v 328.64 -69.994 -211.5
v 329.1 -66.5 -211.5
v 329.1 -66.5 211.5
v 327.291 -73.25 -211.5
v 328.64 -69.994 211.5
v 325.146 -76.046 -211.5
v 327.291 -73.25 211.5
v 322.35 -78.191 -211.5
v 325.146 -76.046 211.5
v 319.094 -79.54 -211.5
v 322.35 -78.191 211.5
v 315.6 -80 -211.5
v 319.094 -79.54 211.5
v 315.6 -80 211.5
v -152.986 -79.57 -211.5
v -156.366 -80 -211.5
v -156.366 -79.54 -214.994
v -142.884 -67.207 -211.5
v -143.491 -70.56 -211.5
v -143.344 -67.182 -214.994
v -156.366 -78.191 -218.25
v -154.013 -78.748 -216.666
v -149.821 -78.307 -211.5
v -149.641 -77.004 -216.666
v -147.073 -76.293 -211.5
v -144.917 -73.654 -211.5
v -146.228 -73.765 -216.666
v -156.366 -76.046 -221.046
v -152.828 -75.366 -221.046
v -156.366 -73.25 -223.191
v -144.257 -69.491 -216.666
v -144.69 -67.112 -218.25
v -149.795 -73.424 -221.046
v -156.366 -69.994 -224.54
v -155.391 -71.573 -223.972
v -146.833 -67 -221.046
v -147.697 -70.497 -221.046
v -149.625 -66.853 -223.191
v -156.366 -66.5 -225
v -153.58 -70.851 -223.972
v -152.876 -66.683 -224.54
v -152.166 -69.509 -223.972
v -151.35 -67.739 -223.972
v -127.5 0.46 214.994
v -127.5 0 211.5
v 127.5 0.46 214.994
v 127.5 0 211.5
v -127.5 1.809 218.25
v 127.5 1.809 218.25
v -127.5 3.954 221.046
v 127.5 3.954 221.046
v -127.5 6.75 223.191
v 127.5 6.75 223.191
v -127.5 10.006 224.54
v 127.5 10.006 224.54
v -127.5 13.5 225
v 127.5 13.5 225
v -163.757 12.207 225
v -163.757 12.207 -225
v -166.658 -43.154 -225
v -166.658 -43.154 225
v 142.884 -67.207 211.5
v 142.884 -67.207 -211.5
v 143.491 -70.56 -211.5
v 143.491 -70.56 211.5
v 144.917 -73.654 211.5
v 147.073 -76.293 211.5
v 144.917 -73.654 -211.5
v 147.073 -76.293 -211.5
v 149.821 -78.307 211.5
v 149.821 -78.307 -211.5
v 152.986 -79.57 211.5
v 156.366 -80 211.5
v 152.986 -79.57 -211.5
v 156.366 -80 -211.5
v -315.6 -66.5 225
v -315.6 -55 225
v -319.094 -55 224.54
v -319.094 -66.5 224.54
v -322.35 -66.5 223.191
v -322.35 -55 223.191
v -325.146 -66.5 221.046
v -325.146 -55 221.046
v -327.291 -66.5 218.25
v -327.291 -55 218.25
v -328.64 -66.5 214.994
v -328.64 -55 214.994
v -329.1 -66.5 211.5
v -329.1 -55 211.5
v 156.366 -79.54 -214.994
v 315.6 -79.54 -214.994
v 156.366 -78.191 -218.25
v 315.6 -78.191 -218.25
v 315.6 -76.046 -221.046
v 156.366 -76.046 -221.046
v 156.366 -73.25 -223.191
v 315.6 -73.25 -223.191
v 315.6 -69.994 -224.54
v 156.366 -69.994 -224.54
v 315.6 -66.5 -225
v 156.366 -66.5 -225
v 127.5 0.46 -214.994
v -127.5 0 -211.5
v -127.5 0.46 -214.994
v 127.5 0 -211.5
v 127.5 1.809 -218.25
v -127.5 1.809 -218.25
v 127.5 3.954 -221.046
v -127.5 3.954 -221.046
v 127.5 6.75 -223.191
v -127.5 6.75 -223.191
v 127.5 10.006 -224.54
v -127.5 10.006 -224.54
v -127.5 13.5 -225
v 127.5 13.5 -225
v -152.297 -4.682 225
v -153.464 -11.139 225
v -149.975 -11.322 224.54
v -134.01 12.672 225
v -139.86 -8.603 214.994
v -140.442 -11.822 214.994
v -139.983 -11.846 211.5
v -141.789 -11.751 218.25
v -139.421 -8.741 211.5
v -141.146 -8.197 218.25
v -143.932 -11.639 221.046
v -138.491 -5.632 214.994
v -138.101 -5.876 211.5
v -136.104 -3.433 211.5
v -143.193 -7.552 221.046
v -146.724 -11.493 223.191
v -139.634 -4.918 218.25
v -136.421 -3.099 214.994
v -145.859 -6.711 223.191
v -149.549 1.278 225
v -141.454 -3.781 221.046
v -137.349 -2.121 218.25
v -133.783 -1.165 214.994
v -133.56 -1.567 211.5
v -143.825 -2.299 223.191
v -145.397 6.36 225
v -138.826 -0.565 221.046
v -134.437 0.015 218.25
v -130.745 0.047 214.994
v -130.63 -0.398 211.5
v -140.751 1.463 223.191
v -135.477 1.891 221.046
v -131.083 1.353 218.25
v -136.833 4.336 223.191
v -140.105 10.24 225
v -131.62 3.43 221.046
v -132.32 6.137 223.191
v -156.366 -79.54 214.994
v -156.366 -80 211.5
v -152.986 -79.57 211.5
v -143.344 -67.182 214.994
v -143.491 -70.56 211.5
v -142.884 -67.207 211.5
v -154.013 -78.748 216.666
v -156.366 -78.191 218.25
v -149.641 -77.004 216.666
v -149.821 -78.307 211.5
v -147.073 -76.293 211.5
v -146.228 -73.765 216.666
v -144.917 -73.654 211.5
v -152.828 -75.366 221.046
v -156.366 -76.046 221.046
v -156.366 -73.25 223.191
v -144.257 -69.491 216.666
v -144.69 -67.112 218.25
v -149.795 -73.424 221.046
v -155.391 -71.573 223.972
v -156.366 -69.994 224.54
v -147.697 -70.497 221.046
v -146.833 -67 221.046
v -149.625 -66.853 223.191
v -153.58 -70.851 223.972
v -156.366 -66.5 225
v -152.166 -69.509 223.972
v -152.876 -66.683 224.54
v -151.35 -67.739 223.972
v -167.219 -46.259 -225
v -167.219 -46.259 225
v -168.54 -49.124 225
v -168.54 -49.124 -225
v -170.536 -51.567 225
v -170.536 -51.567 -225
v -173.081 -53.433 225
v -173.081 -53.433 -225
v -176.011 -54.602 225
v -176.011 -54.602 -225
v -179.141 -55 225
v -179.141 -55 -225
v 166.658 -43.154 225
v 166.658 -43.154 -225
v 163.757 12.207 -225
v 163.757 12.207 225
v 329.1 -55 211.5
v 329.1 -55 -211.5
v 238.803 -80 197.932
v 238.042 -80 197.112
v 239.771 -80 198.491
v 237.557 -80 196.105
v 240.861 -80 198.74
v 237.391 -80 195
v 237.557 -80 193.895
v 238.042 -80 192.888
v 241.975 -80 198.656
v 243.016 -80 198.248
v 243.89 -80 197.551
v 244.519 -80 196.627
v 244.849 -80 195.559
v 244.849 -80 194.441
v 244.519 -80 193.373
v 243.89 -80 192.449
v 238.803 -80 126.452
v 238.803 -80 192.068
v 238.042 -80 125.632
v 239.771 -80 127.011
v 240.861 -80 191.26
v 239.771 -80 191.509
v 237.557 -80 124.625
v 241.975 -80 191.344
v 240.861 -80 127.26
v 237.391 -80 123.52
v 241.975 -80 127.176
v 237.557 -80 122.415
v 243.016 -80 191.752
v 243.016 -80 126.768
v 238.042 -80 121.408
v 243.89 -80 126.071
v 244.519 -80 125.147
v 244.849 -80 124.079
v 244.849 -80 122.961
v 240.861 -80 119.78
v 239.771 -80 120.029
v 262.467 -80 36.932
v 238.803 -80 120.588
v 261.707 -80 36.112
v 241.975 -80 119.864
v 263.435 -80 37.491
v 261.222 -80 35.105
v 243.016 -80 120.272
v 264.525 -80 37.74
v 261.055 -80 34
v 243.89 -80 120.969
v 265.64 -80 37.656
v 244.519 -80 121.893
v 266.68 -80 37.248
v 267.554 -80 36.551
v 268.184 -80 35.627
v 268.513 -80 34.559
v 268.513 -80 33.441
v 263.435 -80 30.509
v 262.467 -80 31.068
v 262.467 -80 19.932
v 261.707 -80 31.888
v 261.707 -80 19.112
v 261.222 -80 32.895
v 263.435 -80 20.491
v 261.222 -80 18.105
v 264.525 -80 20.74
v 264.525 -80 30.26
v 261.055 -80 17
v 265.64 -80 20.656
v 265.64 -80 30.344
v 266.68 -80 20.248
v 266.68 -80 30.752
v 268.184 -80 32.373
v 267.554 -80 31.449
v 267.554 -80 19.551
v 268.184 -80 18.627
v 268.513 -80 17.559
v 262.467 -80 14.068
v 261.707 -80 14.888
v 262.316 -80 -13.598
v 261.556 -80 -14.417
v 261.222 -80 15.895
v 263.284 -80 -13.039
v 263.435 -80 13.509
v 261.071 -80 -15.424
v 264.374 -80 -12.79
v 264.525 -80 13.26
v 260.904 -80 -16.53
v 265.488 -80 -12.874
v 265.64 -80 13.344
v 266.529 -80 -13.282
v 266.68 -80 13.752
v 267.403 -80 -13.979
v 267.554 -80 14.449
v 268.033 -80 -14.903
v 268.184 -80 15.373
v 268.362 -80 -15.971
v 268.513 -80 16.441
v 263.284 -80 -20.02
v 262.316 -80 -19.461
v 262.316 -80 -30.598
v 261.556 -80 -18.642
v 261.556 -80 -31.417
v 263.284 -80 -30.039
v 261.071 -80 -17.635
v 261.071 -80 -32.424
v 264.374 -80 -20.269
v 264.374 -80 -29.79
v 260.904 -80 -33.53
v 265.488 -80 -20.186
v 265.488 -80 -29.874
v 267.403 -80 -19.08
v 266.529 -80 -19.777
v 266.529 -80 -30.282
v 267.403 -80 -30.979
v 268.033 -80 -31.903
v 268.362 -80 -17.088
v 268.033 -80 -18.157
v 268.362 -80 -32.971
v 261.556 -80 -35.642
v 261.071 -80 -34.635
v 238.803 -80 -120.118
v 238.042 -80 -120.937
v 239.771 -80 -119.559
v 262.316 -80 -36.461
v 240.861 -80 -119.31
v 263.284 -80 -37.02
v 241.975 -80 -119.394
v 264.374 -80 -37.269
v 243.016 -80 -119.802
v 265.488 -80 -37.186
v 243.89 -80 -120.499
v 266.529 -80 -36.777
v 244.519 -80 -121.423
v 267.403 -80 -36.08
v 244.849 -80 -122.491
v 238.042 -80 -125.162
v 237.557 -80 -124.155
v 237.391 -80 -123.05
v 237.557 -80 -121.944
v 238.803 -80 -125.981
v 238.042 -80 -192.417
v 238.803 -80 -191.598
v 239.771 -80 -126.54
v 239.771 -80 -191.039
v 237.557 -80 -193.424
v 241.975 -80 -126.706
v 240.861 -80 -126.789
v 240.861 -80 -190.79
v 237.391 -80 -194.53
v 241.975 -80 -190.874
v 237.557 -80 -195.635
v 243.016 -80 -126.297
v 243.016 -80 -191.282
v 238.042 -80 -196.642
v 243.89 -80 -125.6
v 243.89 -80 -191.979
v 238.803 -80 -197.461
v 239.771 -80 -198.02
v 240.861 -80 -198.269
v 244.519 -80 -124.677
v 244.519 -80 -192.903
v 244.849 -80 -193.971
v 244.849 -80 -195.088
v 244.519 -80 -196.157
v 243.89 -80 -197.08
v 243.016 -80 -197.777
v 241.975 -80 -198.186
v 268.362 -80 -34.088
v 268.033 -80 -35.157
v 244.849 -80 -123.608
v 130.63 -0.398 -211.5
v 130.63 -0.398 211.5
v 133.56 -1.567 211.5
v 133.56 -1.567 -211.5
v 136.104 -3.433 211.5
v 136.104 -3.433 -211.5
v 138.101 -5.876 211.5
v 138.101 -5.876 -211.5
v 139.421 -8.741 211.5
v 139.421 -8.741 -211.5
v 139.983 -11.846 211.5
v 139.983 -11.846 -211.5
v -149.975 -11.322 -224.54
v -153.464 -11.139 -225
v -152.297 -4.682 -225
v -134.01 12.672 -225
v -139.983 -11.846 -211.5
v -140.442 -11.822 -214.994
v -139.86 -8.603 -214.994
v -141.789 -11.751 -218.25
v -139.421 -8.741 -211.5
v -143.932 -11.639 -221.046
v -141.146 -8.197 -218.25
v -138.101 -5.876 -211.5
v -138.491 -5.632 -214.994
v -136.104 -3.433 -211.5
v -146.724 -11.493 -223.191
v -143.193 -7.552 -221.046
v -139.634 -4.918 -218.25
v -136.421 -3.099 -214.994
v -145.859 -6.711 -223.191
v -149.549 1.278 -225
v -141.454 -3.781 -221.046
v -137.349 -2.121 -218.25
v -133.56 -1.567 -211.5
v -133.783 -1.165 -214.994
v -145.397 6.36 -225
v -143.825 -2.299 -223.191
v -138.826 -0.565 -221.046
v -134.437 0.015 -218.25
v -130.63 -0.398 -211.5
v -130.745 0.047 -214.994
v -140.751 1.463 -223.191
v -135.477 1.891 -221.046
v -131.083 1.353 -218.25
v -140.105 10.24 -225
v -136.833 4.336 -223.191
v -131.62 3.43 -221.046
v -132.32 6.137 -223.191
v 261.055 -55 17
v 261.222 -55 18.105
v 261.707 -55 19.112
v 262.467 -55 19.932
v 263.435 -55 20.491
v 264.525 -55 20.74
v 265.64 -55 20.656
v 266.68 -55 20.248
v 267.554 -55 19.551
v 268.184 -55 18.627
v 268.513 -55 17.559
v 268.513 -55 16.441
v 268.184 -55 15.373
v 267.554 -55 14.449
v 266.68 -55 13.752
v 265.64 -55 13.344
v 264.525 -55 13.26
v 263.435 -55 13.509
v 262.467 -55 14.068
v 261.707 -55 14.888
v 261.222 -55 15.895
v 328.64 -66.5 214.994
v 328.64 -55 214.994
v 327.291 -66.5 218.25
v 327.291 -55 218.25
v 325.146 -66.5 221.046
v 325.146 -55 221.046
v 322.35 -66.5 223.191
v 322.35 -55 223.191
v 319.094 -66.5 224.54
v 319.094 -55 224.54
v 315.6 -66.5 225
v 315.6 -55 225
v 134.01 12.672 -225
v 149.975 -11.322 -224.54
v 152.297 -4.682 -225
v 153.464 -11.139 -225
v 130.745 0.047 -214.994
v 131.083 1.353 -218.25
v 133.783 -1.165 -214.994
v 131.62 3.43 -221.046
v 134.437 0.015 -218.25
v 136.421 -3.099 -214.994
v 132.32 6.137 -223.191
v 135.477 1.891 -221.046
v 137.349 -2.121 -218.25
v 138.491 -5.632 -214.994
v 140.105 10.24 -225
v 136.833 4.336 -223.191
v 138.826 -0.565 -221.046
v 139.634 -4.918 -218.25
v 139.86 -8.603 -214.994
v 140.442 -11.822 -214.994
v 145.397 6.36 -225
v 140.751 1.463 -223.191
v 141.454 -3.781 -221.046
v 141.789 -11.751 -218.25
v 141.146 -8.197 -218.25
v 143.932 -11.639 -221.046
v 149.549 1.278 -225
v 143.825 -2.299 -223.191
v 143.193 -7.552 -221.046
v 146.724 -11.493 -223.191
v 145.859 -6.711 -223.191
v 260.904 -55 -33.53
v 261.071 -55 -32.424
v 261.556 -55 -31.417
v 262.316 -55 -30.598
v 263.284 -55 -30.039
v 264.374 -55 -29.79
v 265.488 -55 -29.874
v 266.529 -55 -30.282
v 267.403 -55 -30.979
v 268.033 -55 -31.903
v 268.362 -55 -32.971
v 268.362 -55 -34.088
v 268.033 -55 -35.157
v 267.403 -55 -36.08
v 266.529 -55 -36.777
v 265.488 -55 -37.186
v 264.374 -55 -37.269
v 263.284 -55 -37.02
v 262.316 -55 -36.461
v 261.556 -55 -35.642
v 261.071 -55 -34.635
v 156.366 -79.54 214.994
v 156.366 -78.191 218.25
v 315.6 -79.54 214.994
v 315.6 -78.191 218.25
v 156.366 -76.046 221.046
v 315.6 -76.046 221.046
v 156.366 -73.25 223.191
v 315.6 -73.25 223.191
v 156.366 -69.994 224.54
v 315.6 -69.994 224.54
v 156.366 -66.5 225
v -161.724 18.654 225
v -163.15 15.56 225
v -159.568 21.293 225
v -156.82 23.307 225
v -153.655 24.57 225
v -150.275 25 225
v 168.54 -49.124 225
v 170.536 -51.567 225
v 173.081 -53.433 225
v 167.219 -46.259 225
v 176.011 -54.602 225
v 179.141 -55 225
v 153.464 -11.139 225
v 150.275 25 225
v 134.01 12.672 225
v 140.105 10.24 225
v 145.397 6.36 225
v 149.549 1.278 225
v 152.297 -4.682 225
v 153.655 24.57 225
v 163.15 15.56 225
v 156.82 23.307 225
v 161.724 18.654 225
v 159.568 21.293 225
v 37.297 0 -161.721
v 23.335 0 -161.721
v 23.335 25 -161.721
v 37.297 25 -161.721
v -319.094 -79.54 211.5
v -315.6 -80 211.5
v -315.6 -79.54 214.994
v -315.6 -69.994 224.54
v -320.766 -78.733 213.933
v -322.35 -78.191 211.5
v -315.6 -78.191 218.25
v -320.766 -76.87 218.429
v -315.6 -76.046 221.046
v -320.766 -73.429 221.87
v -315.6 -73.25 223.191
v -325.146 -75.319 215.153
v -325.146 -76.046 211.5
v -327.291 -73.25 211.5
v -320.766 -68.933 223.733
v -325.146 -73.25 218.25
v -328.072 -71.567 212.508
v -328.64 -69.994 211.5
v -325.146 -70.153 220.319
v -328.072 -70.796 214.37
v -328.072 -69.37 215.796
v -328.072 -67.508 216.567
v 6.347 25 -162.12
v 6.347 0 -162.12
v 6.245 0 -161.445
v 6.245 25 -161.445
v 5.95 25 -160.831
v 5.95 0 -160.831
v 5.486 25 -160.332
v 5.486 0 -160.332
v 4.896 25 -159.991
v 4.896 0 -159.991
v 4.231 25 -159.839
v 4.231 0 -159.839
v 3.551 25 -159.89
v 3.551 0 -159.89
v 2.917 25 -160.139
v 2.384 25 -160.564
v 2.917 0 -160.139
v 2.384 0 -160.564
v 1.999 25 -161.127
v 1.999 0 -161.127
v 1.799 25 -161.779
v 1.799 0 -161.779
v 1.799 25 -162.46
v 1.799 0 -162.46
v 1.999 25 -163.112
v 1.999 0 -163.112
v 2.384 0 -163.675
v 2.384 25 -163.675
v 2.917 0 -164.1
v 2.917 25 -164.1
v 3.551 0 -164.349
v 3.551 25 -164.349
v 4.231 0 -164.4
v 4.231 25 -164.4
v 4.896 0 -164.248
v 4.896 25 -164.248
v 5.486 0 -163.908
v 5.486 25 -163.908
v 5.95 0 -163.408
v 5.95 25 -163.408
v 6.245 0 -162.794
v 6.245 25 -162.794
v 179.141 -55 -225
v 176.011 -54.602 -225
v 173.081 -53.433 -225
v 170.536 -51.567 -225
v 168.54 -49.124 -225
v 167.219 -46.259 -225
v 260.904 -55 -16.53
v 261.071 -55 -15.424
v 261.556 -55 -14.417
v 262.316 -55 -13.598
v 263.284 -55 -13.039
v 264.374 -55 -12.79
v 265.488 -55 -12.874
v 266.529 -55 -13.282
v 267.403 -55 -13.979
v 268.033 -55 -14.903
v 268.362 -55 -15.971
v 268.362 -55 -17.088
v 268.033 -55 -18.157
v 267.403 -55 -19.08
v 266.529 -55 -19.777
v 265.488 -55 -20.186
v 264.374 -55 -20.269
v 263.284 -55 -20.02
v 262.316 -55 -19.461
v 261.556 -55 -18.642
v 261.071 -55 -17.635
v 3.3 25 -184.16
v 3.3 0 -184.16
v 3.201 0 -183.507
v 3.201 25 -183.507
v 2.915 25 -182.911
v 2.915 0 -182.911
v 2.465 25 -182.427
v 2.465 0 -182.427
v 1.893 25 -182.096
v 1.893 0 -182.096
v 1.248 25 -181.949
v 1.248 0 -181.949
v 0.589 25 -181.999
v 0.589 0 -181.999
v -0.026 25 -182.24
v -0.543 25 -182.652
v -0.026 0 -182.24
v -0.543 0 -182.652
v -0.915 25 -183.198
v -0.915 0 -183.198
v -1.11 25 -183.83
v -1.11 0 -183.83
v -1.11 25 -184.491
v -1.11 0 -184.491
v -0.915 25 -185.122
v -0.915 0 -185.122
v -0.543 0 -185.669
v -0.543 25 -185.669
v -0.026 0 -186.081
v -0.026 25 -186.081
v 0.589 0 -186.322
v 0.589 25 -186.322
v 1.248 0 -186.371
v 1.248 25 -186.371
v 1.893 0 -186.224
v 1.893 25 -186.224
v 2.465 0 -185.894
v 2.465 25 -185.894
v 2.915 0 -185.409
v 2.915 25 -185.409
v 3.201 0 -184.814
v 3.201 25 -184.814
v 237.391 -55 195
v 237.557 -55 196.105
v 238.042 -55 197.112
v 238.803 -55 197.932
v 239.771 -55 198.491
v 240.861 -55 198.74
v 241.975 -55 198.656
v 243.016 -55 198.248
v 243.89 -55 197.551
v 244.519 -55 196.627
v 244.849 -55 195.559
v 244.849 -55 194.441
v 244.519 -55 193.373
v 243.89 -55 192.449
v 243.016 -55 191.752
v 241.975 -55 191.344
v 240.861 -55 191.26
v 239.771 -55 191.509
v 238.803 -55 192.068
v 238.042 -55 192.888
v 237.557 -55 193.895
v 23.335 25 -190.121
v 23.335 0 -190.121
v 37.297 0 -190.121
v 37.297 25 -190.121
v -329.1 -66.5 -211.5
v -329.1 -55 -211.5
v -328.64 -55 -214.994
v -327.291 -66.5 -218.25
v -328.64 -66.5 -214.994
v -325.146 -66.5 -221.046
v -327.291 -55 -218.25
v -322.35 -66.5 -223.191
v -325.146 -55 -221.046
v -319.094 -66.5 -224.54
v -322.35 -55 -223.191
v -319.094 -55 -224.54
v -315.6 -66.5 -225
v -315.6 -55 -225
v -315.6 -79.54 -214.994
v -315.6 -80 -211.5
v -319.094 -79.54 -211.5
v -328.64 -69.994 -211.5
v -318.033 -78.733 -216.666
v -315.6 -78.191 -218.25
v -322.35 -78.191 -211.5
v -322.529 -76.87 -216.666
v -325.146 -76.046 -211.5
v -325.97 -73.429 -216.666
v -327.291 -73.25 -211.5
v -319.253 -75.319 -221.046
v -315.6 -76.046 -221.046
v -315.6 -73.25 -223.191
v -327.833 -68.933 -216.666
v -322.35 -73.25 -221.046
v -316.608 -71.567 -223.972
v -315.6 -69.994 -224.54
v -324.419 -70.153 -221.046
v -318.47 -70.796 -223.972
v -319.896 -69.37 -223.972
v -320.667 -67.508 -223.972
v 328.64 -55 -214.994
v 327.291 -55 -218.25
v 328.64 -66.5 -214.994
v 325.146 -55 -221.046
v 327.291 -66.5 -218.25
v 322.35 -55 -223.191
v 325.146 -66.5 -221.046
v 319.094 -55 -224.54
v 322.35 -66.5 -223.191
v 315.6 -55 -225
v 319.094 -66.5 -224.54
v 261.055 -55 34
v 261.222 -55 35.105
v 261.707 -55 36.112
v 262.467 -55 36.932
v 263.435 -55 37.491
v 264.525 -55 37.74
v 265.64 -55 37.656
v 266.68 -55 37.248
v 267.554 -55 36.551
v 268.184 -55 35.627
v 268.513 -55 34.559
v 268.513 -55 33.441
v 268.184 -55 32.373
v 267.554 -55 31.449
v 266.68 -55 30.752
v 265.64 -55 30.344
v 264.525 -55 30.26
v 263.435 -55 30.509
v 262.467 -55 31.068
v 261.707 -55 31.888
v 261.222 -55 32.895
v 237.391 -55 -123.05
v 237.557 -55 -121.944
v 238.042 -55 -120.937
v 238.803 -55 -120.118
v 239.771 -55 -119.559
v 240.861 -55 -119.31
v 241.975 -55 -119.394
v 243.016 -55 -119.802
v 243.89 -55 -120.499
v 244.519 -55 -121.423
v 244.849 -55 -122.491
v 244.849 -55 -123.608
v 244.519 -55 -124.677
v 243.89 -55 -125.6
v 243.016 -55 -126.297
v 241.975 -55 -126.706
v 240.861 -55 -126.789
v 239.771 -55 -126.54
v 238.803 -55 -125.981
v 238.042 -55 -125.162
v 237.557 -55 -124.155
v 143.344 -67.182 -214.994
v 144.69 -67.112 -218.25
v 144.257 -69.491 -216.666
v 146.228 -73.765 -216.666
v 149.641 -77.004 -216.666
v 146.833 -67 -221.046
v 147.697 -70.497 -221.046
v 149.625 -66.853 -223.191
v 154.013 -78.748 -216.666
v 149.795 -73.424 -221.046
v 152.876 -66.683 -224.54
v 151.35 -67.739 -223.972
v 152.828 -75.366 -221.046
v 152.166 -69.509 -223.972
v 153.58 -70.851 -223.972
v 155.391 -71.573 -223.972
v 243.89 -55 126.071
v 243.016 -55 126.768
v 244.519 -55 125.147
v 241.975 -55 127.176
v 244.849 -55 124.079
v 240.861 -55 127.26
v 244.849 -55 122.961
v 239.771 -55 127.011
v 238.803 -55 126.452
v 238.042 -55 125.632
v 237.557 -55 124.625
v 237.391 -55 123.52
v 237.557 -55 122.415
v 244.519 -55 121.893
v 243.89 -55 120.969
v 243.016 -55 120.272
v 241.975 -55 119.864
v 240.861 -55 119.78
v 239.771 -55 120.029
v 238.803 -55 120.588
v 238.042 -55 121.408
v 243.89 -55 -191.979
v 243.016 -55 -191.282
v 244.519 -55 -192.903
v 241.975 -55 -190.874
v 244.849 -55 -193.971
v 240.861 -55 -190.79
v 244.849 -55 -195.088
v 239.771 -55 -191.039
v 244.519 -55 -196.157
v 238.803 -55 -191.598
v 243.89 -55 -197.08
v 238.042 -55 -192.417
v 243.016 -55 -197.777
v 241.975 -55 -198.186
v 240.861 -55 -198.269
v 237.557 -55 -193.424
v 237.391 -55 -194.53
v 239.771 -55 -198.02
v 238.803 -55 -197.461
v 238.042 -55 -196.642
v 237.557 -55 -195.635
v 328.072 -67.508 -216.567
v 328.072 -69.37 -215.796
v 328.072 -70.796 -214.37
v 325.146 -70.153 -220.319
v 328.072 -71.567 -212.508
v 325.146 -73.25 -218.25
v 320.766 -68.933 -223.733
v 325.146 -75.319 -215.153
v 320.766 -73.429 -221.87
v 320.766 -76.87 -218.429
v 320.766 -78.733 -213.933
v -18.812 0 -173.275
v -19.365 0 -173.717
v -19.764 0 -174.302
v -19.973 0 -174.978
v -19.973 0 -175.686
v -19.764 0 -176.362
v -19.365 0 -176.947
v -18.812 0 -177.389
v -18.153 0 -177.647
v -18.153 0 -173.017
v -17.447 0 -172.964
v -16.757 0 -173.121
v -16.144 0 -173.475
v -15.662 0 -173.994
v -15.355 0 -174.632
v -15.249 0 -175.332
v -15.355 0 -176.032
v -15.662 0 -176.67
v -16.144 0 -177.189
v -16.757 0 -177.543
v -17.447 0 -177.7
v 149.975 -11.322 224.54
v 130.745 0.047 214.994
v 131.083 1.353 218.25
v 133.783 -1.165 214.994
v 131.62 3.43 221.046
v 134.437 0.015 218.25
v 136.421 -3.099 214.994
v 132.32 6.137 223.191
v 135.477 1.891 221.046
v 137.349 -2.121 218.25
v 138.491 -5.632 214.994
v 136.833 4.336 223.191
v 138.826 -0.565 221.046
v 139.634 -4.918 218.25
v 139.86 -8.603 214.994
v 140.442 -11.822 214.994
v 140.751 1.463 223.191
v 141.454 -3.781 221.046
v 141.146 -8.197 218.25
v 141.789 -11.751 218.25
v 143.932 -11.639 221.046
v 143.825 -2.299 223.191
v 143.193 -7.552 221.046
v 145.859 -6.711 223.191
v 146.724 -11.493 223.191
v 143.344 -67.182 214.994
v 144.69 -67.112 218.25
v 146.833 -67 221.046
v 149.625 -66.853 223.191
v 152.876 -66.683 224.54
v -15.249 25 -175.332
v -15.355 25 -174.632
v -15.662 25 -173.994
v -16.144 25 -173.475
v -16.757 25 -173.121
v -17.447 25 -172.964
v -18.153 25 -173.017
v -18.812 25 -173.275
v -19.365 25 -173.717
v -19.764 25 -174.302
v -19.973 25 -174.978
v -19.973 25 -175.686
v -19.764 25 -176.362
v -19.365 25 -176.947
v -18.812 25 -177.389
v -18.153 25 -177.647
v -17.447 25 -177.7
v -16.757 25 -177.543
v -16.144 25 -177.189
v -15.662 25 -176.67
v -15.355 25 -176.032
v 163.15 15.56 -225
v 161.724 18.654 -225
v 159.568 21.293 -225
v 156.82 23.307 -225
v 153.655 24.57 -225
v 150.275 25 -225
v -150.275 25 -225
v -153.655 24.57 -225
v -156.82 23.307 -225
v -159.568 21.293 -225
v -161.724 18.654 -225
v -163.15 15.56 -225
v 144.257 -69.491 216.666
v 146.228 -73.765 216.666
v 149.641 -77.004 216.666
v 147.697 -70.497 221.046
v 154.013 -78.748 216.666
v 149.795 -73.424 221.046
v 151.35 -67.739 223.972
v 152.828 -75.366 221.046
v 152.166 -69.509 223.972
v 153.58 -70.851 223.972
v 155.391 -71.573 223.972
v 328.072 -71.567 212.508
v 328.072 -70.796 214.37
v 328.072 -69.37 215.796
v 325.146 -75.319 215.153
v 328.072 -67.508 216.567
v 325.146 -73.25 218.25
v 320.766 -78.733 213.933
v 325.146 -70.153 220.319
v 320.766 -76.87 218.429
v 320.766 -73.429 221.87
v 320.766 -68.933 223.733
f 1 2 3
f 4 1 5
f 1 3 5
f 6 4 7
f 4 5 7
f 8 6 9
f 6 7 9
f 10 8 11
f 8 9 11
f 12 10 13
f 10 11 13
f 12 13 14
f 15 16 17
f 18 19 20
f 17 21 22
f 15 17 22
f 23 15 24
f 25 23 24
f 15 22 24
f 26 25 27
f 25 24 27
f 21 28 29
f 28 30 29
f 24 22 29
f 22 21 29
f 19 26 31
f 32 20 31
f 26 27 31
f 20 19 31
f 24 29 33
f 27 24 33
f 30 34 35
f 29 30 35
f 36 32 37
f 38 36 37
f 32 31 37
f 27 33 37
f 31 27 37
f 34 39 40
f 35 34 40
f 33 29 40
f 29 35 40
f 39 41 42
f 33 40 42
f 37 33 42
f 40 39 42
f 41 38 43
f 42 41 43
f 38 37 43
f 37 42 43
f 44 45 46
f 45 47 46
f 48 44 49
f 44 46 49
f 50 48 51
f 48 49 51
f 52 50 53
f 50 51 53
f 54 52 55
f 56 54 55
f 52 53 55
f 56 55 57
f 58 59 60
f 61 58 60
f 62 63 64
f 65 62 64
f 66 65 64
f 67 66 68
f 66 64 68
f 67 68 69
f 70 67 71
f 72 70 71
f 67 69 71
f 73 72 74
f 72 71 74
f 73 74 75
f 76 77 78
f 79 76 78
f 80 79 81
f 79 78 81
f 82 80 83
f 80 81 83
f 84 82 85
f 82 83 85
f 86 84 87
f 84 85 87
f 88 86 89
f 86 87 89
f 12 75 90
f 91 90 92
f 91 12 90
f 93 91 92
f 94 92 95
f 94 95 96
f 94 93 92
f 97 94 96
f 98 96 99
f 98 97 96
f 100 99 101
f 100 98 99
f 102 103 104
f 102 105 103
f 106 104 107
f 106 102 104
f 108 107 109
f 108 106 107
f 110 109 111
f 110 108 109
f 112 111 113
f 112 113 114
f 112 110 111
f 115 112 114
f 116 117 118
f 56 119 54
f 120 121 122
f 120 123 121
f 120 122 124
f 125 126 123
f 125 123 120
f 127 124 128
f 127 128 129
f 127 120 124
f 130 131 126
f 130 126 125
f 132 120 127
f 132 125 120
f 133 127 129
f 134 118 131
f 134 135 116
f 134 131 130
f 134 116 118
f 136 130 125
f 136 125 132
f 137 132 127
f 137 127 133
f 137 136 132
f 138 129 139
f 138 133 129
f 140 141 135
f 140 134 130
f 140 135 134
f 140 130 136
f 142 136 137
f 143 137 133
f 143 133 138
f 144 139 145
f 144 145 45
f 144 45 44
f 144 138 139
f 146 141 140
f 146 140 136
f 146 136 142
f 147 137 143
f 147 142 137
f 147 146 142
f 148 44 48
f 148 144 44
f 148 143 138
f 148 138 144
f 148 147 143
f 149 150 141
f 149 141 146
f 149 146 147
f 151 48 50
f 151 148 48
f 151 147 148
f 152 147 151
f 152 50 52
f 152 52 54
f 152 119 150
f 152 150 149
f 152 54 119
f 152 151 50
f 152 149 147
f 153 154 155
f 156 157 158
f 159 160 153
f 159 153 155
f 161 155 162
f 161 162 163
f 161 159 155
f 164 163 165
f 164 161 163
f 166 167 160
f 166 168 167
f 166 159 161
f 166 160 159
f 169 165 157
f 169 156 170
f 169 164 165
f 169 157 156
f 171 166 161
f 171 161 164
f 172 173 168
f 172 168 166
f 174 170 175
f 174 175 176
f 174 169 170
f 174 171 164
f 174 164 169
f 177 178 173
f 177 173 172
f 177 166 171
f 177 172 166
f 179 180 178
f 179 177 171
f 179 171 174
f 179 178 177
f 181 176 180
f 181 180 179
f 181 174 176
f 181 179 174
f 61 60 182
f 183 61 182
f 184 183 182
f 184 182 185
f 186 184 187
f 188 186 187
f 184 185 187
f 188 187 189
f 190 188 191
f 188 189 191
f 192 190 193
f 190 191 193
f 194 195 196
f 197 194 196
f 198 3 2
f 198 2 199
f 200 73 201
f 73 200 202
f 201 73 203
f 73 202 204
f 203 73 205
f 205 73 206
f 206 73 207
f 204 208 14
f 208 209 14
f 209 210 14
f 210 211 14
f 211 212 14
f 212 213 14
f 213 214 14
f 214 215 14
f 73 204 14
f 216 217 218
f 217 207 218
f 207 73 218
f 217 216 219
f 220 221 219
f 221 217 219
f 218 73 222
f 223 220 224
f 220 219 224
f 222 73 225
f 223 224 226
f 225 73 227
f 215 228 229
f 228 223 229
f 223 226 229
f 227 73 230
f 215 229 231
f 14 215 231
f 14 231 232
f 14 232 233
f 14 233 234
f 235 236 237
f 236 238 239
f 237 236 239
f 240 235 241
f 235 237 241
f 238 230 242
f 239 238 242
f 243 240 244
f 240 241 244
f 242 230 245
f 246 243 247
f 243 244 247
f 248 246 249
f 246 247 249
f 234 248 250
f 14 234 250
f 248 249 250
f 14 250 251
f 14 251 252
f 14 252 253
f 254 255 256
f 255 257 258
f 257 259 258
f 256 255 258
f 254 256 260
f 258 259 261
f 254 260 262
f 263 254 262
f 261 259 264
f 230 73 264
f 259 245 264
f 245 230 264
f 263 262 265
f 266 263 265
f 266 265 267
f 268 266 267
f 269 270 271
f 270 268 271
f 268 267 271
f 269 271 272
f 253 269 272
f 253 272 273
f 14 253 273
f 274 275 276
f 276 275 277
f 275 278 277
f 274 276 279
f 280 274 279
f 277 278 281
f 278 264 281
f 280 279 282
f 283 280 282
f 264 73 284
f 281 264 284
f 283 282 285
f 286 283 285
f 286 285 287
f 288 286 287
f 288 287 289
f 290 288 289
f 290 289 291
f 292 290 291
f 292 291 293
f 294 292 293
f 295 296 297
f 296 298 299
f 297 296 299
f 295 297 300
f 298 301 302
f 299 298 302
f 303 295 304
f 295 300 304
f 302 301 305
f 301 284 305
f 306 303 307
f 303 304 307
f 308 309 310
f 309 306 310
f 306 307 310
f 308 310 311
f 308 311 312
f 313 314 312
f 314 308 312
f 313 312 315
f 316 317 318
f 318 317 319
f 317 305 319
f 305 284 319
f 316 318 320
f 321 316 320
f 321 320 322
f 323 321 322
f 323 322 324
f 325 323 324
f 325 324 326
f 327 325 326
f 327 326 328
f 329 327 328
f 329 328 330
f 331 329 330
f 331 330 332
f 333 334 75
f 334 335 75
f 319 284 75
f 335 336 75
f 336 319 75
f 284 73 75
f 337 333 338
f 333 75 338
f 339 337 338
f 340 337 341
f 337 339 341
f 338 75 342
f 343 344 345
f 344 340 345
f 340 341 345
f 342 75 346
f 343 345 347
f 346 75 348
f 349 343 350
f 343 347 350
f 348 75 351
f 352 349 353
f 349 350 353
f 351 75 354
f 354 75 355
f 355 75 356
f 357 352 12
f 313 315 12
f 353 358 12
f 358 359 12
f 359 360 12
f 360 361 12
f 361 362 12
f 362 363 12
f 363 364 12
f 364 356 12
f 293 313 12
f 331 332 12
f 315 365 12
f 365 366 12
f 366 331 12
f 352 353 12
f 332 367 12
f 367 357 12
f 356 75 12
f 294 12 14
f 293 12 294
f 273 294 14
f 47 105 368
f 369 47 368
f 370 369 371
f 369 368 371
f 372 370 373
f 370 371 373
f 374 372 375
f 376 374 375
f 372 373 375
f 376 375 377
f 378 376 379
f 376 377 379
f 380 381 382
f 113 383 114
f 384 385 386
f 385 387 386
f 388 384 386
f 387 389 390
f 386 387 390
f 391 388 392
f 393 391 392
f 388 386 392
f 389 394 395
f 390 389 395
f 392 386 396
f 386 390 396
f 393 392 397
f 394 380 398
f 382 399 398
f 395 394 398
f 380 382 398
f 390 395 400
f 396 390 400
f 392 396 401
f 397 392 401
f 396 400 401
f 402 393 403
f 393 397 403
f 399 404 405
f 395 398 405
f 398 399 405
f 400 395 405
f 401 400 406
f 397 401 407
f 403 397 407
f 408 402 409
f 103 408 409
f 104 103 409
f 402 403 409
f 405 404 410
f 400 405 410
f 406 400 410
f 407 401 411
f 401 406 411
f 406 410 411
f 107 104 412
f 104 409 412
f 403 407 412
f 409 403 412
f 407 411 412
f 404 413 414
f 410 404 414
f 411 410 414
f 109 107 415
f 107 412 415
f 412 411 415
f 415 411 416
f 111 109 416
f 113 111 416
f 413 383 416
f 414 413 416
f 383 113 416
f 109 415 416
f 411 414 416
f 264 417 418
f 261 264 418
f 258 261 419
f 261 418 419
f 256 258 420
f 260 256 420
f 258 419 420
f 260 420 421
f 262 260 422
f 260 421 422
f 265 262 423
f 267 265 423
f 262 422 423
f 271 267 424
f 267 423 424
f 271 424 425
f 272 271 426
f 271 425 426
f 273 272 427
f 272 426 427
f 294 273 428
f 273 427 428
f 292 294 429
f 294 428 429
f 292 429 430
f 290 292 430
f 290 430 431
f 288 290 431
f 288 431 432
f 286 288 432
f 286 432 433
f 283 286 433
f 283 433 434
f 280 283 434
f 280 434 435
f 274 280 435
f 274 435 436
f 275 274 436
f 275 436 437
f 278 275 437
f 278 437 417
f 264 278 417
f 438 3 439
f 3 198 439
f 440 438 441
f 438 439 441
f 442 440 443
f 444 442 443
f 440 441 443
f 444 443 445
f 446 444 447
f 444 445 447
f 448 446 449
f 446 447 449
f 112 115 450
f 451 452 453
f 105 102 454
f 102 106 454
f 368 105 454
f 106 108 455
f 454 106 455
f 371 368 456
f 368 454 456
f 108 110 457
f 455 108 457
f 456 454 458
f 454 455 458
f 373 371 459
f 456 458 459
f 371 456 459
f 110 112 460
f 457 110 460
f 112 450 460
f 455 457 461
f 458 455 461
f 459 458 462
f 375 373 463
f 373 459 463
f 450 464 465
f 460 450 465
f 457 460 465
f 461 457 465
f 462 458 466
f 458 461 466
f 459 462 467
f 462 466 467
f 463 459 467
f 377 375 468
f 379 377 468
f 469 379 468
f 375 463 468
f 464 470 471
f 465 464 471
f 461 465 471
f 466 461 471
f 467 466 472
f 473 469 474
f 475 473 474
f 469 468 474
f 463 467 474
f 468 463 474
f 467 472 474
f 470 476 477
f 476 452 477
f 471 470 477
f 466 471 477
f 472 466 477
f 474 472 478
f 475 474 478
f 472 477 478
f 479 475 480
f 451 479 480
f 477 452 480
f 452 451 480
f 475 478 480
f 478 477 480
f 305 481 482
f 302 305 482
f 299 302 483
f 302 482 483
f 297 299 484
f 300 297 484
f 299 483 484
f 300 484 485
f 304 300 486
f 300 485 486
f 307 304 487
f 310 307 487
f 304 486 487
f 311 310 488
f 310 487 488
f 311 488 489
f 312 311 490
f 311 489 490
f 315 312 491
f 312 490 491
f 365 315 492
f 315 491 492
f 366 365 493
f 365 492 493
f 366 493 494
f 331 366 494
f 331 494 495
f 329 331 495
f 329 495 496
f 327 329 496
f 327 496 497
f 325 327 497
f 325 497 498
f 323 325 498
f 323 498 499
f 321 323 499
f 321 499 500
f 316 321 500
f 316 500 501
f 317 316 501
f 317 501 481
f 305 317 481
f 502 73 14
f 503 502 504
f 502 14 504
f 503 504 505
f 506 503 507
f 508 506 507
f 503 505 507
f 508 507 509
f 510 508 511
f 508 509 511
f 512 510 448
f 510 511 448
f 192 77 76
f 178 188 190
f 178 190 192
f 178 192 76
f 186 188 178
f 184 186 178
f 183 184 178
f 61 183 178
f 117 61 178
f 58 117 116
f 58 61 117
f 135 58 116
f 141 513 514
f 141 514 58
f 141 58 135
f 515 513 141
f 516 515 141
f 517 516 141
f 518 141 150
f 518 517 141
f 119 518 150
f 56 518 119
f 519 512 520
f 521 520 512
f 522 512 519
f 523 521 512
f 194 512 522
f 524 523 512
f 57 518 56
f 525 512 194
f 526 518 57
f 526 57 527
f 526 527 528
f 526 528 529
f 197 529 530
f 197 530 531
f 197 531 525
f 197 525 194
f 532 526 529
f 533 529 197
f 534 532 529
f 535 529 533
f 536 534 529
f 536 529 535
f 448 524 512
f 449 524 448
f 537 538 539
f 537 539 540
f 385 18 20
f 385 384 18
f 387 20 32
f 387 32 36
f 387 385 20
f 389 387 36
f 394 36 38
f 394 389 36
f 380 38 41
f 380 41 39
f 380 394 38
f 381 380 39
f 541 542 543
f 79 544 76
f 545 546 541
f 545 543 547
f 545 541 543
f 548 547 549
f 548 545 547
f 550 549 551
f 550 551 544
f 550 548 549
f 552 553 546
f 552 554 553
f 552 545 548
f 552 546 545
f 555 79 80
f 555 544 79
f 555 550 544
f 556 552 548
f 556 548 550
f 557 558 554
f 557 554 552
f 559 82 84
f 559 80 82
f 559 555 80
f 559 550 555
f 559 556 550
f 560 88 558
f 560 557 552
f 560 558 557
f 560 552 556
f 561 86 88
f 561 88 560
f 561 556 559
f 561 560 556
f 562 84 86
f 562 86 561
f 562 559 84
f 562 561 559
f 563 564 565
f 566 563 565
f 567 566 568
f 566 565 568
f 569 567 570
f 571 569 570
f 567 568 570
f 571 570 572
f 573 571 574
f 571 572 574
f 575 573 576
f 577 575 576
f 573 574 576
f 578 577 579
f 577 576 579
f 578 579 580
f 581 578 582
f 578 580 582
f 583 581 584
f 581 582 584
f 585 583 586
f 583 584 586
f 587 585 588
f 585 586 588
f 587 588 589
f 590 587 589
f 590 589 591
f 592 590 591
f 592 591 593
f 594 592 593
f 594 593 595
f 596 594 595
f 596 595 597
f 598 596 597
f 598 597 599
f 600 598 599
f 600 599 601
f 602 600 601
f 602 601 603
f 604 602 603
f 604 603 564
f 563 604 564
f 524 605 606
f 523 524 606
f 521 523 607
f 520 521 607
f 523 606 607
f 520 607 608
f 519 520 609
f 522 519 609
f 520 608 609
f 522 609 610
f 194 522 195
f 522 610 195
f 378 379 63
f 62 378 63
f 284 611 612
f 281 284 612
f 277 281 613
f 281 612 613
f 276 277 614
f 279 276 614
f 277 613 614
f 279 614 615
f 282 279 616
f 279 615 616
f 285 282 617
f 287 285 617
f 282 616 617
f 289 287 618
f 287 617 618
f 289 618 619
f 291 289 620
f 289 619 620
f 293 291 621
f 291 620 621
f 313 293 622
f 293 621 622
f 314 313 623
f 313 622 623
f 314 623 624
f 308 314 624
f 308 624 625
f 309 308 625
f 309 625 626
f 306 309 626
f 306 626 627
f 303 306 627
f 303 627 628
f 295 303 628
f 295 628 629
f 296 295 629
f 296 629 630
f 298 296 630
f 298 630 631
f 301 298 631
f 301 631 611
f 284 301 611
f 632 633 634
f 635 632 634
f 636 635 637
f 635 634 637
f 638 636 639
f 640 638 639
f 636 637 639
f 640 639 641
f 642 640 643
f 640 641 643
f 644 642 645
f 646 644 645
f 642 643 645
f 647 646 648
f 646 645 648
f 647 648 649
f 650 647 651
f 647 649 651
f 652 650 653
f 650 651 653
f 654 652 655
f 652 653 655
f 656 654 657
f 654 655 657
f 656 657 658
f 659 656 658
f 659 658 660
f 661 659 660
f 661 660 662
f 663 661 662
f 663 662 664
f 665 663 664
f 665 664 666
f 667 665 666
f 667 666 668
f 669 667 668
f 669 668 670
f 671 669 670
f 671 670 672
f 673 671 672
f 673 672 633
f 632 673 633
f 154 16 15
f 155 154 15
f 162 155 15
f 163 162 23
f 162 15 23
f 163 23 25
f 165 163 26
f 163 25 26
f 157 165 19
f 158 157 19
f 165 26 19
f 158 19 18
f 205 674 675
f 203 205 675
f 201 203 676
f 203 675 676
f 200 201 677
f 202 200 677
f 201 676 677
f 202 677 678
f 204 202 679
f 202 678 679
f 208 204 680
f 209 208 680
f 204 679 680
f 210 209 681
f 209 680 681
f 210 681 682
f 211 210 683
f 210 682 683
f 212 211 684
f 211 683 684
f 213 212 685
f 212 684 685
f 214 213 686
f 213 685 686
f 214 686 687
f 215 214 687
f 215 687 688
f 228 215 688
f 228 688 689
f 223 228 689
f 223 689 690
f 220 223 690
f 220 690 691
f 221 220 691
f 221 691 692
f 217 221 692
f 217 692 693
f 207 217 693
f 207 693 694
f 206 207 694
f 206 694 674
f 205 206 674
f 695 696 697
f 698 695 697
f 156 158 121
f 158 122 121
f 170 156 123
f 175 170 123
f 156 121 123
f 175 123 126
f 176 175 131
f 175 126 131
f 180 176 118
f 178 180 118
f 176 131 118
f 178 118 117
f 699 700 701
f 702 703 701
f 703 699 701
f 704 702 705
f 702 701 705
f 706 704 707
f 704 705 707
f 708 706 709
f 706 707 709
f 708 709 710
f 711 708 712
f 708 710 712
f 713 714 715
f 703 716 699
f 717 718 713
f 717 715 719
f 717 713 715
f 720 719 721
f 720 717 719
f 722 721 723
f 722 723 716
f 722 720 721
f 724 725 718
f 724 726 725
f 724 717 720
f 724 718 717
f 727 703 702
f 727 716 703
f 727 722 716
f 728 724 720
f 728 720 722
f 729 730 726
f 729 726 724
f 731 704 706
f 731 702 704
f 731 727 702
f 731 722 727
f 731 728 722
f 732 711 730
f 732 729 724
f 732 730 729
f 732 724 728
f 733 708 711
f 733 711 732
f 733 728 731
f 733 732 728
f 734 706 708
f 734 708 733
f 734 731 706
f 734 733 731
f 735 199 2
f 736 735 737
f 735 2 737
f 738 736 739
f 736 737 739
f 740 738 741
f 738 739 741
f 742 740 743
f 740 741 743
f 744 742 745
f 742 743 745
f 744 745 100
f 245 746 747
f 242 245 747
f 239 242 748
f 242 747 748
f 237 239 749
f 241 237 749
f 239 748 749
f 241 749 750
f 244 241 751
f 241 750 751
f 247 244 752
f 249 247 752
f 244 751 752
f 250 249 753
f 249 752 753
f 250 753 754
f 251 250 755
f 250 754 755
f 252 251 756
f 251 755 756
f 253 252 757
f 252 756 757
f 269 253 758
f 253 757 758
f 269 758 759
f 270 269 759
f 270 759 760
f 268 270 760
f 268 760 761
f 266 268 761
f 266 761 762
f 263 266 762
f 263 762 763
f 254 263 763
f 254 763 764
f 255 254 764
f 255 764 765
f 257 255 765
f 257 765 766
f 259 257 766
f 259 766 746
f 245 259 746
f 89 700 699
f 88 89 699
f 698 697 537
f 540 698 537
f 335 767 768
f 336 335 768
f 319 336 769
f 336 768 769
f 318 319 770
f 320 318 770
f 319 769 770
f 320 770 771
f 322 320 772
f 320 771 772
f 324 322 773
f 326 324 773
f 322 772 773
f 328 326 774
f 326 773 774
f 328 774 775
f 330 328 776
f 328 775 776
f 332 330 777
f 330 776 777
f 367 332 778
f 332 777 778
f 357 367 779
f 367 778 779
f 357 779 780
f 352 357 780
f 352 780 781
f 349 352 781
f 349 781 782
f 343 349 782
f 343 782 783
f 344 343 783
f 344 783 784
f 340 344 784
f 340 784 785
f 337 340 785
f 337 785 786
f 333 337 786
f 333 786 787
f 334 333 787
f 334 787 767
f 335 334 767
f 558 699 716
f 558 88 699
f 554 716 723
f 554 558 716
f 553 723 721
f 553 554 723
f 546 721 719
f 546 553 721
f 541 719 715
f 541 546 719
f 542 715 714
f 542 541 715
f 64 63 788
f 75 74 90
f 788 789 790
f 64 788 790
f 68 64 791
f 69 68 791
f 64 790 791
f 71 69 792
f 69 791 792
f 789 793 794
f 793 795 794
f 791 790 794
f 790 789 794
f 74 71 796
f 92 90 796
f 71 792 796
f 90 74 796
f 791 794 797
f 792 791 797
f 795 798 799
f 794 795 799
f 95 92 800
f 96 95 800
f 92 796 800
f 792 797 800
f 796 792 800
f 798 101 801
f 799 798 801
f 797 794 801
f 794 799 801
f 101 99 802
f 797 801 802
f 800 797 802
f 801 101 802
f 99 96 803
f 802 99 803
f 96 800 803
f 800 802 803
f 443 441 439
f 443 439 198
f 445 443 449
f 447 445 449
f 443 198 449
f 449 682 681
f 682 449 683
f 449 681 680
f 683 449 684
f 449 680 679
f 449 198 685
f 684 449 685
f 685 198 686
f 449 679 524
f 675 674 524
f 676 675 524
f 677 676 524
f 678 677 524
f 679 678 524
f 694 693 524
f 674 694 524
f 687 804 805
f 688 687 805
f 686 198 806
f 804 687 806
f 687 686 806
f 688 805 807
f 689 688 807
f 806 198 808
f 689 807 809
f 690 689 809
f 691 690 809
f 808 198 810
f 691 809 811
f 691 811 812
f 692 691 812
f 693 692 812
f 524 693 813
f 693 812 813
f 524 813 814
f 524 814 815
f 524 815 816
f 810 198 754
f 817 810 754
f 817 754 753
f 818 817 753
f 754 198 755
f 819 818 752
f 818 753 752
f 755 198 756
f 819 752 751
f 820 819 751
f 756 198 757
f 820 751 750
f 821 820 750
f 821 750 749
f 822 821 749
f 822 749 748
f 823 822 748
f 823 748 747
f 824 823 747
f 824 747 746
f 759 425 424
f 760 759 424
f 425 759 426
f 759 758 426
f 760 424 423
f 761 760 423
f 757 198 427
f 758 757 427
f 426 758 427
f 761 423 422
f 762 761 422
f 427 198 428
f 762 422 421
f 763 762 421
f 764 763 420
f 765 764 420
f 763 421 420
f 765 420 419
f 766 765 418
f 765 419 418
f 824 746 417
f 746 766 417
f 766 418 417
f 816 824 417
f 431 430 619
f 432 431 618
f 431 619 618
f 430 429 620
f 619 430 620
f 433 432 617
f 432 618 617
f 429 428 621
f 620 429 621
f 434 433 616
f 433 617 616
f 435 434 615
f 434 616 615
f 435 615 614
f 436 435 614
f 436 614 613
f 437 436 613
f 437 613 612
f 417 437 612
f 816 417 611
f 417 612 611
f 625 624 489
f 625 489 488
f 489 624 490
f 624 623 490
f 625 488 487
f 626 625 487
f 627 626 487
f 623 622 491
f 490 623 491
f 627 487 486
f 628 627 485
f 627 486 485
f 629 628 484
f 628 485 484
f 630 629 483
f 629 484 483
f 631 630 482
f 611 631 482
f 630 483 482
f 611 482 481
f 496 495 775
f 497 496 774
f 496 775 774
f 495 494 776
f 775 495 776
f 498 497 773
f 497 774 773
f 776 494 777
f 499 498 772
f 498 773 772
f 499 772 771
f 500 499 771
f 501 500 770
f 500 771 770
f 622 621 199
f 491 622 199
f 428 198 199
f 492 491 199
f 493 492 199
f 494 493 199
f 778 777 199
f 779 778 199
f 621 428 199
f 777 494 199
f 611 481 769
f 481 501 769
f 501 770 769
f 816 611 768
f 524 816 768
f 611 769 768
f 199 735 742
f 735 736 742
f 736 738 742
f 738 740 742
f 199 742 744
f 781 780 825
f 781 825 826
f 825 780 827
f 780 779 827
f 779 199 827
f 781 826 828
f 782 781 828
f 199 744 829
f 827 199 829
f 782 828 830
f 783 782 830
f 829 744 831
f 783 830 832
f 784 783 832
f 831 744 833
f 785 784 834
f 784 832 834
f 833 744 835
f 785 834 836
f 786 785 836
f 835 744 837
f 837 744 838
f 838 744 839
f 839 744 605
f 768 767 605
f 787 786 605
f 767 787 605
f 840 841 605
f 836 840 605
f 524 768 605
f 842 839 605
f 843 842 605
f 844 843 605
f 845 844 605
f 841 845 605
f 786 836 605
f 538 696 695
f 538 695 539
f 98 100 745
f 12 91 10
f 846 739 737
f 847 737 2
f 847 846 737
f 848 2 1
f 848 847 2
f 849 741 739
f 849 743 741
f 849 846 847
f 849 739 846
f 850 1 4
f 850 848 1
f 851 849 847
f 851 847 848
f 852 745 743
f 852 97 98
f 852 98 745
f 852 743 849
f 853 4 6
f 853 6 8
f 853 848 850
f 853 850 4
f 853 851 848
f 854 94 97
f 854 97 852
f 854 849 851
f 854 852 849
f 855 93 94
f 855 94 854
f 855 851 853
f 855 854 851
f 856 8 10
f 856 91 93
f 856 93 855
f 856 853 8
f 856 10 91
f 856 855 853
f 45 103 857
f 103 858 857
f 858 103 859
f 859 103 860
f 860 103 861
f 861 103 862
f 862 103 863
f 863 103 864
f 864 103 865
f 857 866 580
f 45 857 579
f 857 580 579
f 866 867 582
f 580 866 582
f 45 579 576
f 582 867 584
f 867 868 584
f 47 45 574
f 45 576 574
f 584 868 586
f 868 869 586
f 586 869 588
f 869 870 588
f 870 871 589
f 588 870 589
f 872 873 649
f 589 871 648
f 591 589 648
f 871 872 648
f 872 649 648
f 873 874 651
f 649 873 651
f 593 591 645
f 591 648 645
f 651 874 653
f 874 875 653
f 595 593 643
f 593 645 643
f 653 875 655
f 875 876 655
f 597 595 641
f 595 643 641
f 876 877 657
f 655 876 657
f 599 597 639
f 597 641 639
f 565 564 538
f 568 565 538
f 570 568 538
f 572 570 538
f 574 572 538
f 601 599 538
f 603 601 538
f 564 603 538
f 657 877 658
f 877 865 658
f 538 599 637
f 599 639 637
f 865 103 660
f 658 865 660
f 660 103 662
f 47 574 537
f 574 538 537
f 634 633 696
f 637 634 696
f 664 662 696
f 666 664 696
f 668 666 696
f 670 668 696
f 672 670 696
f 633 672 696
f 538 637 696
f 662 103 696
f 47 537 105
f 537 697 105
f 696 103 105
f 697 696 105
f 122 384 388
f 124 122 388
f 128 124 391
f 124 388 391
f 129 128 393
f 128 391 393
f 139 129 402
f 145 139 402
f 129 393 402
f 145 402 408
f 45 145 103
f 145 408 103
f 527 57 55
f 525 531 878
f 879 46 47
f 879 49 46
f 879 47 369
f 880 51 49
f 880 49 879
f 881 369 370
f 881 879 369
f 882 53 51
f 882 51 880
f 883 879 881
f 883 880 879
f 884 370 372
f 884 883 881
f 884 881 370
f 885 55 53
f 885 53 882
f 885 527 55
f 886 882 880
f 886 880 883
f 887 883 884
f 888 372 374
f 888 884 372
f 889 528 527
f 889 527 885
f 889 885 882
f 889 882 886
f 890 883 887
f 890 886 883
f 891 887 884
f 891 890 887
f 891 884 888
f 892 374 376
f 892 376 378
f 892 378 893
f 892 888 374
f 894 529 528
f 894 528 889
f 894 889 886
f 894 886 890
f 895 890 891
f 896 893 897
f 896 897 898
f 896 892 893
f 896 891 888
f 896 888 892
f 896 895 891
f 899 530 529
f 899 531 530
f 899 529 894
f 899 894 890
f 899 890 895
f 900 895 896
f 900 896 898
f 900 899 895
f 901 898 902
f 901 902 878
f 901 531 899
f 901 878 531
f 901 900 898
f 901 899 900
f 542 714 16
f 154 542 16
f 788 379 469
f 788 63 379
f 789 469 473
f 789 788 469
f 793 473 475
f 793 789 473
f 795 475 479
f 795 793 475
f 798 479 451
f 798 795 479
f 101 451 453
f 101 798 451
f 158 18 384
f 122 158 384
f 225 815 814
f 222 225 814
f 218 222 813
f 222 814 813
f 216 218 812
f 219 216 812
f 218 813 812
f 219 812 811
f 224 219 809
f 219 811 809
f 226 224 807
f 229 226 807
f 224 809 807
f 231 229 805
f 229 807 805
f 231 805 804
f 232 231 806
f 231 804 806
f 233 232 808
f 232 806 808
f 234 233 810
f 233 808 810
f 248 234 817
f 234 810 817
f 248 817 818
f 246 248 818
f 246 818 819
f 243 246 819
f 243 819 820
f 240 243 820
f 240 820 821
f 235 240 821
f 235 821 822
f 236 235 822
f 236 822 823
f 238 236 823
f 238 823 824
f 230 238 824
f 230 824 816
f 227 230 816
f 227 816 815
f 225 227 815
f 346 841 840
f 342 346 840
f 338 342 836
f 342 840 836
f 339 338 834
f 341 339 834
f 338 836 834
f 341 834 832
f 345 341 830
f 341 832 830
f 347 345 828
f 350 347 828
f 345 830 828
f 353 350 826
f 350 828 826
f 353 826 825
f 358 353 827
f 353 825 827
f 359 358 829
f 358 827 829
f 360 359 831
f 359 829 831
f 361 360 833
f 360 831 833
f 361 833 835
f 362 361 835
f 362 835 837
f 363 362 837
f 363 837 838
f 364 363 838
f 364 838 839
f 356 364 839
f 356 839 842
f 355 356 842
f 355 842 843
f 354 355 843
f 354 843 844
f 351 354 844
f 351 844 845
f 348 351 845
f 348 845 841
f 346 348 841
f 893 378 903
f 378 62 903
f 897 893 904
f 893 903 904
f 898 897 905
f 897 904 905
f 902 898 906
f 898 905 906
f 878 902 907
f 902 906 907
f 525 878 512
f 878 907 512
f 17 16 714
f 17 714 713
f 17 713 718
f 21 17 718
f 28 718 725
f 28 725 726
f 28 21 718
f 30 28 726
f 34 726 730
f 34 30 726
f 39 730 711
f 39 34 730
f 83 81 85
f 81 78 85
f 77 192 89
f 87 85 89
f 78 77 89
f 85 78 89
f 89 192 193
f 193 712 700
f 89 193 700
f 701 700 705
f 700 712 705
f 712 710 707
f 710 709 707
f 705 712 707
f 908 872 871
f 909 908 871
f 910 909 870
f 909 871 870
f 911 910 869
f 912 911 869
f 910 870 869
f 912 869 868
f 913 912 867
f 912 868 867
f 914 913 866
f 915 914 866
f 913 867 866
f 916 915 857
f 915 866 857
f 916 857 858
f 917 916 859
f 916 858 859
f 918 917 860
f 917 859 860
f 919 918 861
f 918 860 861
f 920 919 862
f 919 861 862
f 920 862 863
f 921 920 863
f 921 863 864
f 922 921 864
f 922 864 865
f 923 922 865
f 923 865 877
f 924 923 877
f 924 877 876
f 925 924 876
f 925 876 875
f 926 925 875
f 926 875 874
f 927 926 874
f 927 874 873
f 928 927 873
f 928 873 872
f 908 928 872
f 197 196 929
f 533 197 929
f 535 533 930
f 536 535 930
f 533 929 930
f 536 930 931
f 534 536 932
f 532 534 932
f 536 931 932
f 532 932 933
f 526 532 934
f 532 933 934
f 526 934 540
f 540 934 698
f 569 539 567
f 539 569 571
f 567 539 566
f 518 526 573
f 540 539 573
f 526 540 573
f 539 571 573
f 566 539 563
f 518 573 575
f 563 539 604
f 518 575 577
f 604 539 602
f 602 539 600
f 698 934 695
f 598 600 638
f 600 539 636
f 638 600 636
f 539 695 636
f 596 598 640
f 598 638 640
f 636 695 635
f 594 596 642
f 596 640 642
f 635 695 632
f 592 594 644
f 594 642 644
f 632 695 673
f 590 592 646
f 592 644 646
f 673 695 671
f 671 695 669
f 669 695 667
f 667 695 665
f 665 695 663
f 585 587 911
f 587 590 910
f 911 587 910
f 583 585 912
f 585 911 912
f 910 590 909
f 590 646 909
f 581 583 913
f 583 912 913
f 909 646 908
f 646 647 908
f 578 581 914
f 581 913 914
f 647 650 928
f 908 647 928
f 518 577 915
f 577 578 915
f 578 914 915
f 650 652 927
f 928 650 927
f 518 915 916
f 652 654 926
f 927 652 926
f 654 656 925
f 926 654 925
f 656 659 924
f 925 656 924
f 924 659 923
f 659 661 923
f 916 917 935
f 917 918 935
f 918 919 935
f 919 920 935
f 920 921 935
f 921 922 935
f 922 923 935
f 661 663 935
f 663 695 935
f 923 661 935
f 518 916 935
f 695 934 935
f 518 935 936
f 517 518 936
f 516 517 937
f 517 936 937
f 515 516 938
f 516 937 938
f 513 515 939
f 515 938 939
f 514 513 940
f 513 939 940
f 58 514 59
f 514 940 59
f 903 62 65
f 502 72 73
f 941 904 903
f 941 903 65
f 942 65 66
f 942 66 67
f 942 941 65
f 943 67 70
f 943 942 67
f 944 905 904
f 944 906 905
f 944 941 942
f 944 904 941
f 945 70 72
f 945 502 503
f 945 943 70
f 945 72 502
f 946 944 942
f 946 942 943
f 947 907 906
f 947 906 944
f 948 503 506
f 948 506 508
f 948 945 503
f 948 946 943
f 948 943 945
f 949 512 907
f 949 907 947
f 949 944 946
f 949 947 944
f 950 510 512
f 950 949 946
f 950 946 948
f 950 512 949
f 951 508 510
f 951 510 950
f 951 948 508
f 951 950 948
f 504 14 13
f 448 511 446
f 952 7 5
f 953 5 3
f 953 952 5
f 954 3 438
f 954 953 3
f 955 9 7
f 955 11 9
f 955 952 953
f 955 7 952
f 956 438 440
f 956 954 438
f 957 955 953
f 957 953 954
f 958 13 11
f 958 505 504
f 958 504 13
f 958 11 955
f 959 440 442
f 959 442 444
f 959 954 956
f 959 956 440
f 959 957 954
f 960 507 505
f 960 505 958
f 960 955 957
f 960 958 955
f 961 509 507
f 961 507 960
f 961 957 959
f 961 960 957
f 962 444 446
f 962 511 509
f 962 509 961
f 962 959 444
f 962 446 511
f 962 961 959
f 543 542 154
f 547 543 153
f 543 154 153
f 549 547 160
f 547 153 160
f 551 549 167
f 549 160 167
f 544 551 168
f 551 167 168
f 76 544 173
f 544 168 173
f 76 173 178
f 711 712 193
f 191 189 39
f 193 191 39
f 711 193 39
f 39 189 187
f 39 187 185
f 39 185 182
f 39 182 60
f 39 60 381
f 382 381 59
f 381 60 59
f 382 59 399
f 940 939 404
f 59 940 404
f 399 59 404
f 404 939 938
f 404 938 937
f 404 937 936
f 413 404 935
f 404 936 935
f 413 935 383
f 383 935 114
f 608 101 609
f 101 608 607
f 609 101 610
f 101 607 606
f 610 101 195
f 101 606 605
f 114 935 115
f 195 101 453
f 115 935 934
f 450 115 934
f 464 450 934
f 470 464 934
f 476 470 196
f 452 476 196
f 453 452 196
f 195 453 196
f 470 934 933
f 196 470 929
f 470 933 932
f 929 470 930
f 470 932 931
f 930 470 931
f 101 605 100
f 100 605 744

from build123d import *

# Parameters (mm, degrees)
BOSS_EXTRUDE1_DEPTH      = 225
BOSS_EXTRUDE1_DEPTH_BACK = 225
FILLET1_R                = 13.5
FILLET2_R                = 13.5
FILLET3_R                = 13.5
SKETCH2_R                = 3.75
CUT_EXTRUDE1_DEPTH       = 407.610144979
SKETCH3_R                = 2.217250466
SKETCH3_R_2              = 2.287005769
SKETCH3_R_3              = 2.375
SKETCH3_W                = 13.962530501
SKETCH3_H                = 28.400000001
CUT_EXTRUDE2_DEPTH       = 407.610144979


with BuildPart() as part:
    # Sketch1 → Boss-Extrude1 (new, two sides: drawn at the far end of the back side and taken through both)
    with BuildSketch(Plane.XY.offset(-BOSS_EXTRUDE1_DEPTH_BACK)):
        with BuildLine():
            Line((-329.1, -55), (-329.1, -80))
            Line((-329.1, -80), (-156.365701077, -80))
            ThreePointArc((-156.365701077, -80), (-147.072914305, -76.292554009), (-142.884202358, -67.206535409))
            Line((-142.884202358, -67.206535409), (-139.982869184, -11.845800547))
            ThreePointArc((-139.982869184, -11.845800547), (-136.104432196, -3.432820362), (-127.5, 0))
            Line((-127.5, 0), (127.5, 0))
            ThreePointArc((127.5, 0), (136.104432196, -3.432820362), (139.982869184, -11.845800547))
            Line((139.982869184, -11.845800547), (142.884202358, -67.206535409))
            ThreePointArc((142.884202358, -67.206535409), (147.072914305, -76.292554009), (156.365701077, -80))
            Line((156.365701077, -80), (329.1, -80))
            Line((329.1, -80), (329.1, -55))
            Line((329.1, -55), (179.140850678, -55))
            ThreePointArc((179.140850678, -55), (170.536418482, -51.567179638), (166.657981494, -43.154199453))
            Line((166.657981494, -43.154199453), (163.75664832, 12.206535409))
            ThreePointArc((163.75664832, 12.206535409), (159.567936373, 21.292554009), (150.275149601, 25))
            Line((150.275149601, 25), (-150.275149601, 25))
            ThreePointArc((-150.275149601, 25), (-159.567936373, 21.292554009), (-163.75664832, 12.206535409))
            Line((-163.75664832, 12.206535409), (-166.657981494, -43.154199453))
            ThreePointArc((-166.657981494, -43.154199453), (-170.536418482, -51.567179638), (-179.140850678, -55))
            Line((-179.140850678, -55), (-329.1, -55))
        make_face()
    extrude(amount=BOSS_EXTRUDE1_DEPTH + BOSS_EXTRUDE1_DEPTH_BACK)

    # Fillet1
    fillet1_edges = [part.edges().sort_by_distance(p)[0] for p in [
        (-242.732850539, -80, -225),
        (-147.072914305, -76.292554009, -225),
        (-141.433535771, -39.526167978, -225),
        (-136.104432196, -3.432820362, -225),
        (0, 0, -225),
        (136.104432196, -3.432820362, -225),
        (-329.1, -80, 0),
        (141.433535771, -39.526167978, -225),
        (147.072914305, -76.292554009, -225),
        (242.732850539, -80, -225),
        (-242.732850539, -80, 225),
        (-147.072914305, -76.292554009, 225),
        (-141.433535771, -39.526167978, 225),
        (-136.104432196, -3.432820362, 225),
        (0, 0, 225),
        (136.104432196, -3.432820362, 225),
        (141.433535771, -39.526167978, 225),
        (147.072914305, -76.292554009, 225),
        (242.732850539, -80, 225),
    ]]
    fillet(fillet1_edges, radius=FILLET1_R)

    # Fillet2
    fillet2_edges = [part.edges().sort_by_distance(p)[0] for p in [
        (329.1, -80, 0),
        (329.1, -60.75, 225),
        (329.1, -60.75, -225),
        (329.1, -76.045941546, 221.045941546),
        (329.1, -76.045941546, -221.045941546),
    ]]
    fillet(fillet2_edges, radius=FILLET2_R)

    # Fillet3
    # the kernel refuses this fillet: 13.5 mm, written as the material it takes off along each edge
    with BuildSketch(Plane(origin=(-315.6, -66.5, 211.5), x_dir=(0, 0, 1), z_dir=(-1, 0, 0))) as fillet3_piece_1_section:
        Polygon((0, 0), (FILLET3_R, 0), (FILLET3_R, -FILLET3_R), (0, -FILLET3_R), align=None)
    fillet3_piece_1 = extrude(amount=FILLET3_R, mode=Mode.PRIVATE)
    fillet3_piece_1 = fillet3_piece_1 - Plane(origin=(-315.6, -66.5, 211.5), x_dir=(0, 0.7071067811865475, -0.7071067811865475), z_dir=(-1, 0, 0)) * Sphere(FILLET3_R, mode=Mode.PRIVATE)
    add(fillet3_piece_1, mode=Mode.SUBTRACT)
    with BuildSketch(Plane(origin=(-315.6, -66.5, -211.5), x_dir=(-1, 0, 0), z_dir=(0, 0, -1))) as fillet3_piece_2_section:
        Polygon((0, 0), (FILLET3_R, 0), (FILLET3_R, -FILLET3_R), (0, -FILLET3_R), align=None)
    fillet3_piece_2 = extrude(amount=FILLET3_R, mode=Mode.PRIVATE)
    fillet3_piece_2 = fillet3_piece_2 - Plane(origin=(-315.6, -66.5, -211.5), x_dir=(0.7071067811865475, 0.7071067811865475, 0), z_dir=(0, 0, -1)) * Sphere(FILLET3_R, mode=Mode.PRIVATE)
    add(fillet3_piece_2, mode=Mode.SUBTRACT)
    with BuildSketch(Plane(origin=(-329.1, -21.25, 225), x_dir=(0, 0, -1), z_dir=(0, -1, 0)), Plane(origin=(-329.1, -21.25, -225), x_dir=(1, 0, 0), z_dir=(0, -1, 0))) as fillet3_piece_3:
        with BuildLine():
            CenterArc((FILLET3_R, FILLET3_R), FILLET3_R, 180, 90)
            Line((0, FILLET3_R), (0, 0))
            Line((0, 0), (FILLET3_R, 0))
        make_face()
    extrude(amount=45.25, mode=Mode.SUBTRACT)

    # Sketch2 → Cut-Extrude1 (cut, through all)
    with BuildSketch(Plane(origin=(0, -55, 0), x_dir=(1, 0, 0), z_dir=(0, 1, 0))):
        with Locations(Location((264.653924111, 33.529574354, 0), (0, 0, 180))):
            Circle(SKETCH2_R)
        with Locations(Location((264.653924111, 16.529574354, 0), (0, 0, 180))):
            Circle(SKETCH2_R)
        with Locations(Location((264.805133934, -17, 0), (0, 0, 180))):
            Circle(SKETCH2_R)
        with Locations(Location((264.805133934, -34, 0), (0, 0, 180))):
            Circle(SKETCH2_R)
        with Locations(Location((241.140850678, -195, 0), (0, 0, 180))):
            Circle(SKETCH2_R)
        with Locations(Location((241.140850678, -123.52, 0), (0, 0, 180))):
            Circle(SKETCH2_R)
        with Locations(Location((241.140850678, 123.049574354, 0), (0, 0, 180))):
            Circle(SKETCH2_R)
        with Locations(Location((241.140850678, 194.529574354, 0), (0, 0, 180))):
            Circle(SKETCH2_R)
    extrude(amount=-CUT_EXTRUDE1_DEPTH, mode=Mode.SUBTRACT)

    # Sketch3 → Cut-Extrude2 (cut, through all)
    with BuildSketch(Plane.XZ):
        with Locations((1.08258839, -184.160446131)):
            Circle(SKETCH3_R)
        with Locations((4.060016021, -162.119555044)):
            Circle(SKETCH3_R_2)
        with Locations((-17.624379629, -175.332)):
            Circle(SKETCH3_R_3)
        with Locations((30.315969329, -175.921080945)):
            Rectangle(SKETCH3_W, SKETCH3_H)
    extrude(amount=-CUT_EXTRUDE2_DEPTH, mode=Mode.SUBTRACT)


solid = part.part
